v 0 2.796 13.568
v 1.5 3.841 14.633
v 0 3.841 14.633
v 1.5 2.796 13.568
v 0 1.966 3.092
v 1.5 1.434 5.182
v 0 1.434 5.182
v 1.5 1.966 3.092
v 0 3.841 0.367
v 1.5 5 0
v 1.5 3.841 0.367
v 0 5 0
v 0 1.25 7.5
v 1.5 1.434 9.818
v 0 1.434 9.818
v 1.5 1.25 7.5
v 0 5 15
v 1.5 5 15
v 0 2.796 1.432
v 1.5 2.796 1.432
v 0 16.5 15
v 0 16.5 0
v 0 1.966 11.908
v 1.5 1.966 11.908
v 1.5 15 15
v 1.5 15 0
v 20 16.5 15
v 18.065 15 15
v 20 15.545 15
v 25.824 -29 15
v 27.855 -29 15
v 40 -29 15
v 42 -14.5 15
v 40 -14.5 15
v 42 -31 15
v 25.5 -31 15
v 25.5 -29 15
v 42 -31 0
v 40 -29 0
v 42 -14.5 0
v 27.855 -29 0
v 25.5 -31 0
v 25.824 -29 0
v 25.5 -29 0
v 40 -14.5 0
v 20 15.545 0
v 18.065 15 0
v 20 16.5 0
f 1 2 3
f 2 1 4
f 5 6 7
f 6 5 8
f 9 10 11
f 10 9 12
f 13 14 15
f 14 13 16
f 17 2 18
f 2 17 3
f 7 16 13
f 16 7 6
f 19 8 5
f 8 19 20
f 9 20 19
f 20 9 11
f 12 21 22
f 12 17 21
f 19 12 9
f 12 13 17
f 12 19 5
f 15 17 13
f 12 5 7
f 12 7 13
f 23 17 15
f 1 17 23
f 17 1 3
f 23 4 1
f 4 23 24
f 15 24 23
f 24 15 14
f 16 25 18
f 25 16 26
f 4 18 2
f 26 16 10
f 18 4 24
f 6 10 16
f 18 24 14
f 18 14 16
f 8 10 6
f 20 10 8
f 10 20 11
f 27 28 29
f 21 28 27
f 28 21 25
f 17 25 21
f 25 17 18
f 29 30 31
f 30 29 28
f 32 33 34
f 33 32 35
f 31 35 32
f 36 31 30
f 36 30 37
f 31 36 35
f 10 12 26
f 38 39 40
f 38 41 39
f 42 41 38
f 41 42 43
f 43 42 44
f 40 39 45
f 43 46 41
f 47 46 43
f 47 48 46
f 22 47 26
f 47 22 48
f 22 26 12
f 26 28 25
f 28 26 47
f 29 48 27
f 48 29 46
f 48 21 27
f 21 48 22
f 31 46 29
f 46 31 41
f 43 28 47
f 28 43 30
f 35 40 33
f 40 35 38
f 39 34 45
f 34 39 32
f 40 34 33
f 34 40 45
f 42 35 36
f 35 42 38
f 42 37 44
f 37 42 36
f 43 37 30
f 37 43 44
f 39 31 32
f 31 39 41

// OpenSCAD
// inside_width is the wall width of the top and rounded support
// outside_width is the wall width of all the rest of the piece
// gap is the width of the door where you would hang it + some tolerance value
// height is the height of the piece as sitting on the printbed 

module hook(height = 15, inside_width = 1.5, outside_width=2, gap = 20)
{
	//rounded support
	translate([0,5, height/2])
		rotate([0,90,0])
			scale([1,0.5,1])
				cylinder(h = inside_width, $fn=20, r = height/2);
	translate([0,5,0])
      cube([inside_width, height-5, height]);

	//	top
	translate([0,height, 0]) cube([gap, inside_width, height]);

	// main
 	translate([gap + 6, outside_width-height*2-outside_width, 0])
      rotate([0,0,10])
	  	cube([outside_width, height * 3+inside_width, height]);

	//actual hook
	 	translate([gap + 20, -31, 0])
    	  rotate([0,0,0])
	  		cube([outside_width, height + inside_width, height]);

	 	translate([gap + 20, -31, 0])
    	  rotate([0,0,90])
	  		cube([outside_width, height + inside_width - 2, height]);
		
		// rounded end
//		 translate([rad-outside_width,0,0])
//			scale([1,0.6,1])
//			{
//				translate([0,height, height/2])
//			   	rotate([0,90,0])
//						cylinder(h = outside_width, $fn=20, r = height/2);
//				cube([outside_width, height, height]);
//			}
}

hook();
